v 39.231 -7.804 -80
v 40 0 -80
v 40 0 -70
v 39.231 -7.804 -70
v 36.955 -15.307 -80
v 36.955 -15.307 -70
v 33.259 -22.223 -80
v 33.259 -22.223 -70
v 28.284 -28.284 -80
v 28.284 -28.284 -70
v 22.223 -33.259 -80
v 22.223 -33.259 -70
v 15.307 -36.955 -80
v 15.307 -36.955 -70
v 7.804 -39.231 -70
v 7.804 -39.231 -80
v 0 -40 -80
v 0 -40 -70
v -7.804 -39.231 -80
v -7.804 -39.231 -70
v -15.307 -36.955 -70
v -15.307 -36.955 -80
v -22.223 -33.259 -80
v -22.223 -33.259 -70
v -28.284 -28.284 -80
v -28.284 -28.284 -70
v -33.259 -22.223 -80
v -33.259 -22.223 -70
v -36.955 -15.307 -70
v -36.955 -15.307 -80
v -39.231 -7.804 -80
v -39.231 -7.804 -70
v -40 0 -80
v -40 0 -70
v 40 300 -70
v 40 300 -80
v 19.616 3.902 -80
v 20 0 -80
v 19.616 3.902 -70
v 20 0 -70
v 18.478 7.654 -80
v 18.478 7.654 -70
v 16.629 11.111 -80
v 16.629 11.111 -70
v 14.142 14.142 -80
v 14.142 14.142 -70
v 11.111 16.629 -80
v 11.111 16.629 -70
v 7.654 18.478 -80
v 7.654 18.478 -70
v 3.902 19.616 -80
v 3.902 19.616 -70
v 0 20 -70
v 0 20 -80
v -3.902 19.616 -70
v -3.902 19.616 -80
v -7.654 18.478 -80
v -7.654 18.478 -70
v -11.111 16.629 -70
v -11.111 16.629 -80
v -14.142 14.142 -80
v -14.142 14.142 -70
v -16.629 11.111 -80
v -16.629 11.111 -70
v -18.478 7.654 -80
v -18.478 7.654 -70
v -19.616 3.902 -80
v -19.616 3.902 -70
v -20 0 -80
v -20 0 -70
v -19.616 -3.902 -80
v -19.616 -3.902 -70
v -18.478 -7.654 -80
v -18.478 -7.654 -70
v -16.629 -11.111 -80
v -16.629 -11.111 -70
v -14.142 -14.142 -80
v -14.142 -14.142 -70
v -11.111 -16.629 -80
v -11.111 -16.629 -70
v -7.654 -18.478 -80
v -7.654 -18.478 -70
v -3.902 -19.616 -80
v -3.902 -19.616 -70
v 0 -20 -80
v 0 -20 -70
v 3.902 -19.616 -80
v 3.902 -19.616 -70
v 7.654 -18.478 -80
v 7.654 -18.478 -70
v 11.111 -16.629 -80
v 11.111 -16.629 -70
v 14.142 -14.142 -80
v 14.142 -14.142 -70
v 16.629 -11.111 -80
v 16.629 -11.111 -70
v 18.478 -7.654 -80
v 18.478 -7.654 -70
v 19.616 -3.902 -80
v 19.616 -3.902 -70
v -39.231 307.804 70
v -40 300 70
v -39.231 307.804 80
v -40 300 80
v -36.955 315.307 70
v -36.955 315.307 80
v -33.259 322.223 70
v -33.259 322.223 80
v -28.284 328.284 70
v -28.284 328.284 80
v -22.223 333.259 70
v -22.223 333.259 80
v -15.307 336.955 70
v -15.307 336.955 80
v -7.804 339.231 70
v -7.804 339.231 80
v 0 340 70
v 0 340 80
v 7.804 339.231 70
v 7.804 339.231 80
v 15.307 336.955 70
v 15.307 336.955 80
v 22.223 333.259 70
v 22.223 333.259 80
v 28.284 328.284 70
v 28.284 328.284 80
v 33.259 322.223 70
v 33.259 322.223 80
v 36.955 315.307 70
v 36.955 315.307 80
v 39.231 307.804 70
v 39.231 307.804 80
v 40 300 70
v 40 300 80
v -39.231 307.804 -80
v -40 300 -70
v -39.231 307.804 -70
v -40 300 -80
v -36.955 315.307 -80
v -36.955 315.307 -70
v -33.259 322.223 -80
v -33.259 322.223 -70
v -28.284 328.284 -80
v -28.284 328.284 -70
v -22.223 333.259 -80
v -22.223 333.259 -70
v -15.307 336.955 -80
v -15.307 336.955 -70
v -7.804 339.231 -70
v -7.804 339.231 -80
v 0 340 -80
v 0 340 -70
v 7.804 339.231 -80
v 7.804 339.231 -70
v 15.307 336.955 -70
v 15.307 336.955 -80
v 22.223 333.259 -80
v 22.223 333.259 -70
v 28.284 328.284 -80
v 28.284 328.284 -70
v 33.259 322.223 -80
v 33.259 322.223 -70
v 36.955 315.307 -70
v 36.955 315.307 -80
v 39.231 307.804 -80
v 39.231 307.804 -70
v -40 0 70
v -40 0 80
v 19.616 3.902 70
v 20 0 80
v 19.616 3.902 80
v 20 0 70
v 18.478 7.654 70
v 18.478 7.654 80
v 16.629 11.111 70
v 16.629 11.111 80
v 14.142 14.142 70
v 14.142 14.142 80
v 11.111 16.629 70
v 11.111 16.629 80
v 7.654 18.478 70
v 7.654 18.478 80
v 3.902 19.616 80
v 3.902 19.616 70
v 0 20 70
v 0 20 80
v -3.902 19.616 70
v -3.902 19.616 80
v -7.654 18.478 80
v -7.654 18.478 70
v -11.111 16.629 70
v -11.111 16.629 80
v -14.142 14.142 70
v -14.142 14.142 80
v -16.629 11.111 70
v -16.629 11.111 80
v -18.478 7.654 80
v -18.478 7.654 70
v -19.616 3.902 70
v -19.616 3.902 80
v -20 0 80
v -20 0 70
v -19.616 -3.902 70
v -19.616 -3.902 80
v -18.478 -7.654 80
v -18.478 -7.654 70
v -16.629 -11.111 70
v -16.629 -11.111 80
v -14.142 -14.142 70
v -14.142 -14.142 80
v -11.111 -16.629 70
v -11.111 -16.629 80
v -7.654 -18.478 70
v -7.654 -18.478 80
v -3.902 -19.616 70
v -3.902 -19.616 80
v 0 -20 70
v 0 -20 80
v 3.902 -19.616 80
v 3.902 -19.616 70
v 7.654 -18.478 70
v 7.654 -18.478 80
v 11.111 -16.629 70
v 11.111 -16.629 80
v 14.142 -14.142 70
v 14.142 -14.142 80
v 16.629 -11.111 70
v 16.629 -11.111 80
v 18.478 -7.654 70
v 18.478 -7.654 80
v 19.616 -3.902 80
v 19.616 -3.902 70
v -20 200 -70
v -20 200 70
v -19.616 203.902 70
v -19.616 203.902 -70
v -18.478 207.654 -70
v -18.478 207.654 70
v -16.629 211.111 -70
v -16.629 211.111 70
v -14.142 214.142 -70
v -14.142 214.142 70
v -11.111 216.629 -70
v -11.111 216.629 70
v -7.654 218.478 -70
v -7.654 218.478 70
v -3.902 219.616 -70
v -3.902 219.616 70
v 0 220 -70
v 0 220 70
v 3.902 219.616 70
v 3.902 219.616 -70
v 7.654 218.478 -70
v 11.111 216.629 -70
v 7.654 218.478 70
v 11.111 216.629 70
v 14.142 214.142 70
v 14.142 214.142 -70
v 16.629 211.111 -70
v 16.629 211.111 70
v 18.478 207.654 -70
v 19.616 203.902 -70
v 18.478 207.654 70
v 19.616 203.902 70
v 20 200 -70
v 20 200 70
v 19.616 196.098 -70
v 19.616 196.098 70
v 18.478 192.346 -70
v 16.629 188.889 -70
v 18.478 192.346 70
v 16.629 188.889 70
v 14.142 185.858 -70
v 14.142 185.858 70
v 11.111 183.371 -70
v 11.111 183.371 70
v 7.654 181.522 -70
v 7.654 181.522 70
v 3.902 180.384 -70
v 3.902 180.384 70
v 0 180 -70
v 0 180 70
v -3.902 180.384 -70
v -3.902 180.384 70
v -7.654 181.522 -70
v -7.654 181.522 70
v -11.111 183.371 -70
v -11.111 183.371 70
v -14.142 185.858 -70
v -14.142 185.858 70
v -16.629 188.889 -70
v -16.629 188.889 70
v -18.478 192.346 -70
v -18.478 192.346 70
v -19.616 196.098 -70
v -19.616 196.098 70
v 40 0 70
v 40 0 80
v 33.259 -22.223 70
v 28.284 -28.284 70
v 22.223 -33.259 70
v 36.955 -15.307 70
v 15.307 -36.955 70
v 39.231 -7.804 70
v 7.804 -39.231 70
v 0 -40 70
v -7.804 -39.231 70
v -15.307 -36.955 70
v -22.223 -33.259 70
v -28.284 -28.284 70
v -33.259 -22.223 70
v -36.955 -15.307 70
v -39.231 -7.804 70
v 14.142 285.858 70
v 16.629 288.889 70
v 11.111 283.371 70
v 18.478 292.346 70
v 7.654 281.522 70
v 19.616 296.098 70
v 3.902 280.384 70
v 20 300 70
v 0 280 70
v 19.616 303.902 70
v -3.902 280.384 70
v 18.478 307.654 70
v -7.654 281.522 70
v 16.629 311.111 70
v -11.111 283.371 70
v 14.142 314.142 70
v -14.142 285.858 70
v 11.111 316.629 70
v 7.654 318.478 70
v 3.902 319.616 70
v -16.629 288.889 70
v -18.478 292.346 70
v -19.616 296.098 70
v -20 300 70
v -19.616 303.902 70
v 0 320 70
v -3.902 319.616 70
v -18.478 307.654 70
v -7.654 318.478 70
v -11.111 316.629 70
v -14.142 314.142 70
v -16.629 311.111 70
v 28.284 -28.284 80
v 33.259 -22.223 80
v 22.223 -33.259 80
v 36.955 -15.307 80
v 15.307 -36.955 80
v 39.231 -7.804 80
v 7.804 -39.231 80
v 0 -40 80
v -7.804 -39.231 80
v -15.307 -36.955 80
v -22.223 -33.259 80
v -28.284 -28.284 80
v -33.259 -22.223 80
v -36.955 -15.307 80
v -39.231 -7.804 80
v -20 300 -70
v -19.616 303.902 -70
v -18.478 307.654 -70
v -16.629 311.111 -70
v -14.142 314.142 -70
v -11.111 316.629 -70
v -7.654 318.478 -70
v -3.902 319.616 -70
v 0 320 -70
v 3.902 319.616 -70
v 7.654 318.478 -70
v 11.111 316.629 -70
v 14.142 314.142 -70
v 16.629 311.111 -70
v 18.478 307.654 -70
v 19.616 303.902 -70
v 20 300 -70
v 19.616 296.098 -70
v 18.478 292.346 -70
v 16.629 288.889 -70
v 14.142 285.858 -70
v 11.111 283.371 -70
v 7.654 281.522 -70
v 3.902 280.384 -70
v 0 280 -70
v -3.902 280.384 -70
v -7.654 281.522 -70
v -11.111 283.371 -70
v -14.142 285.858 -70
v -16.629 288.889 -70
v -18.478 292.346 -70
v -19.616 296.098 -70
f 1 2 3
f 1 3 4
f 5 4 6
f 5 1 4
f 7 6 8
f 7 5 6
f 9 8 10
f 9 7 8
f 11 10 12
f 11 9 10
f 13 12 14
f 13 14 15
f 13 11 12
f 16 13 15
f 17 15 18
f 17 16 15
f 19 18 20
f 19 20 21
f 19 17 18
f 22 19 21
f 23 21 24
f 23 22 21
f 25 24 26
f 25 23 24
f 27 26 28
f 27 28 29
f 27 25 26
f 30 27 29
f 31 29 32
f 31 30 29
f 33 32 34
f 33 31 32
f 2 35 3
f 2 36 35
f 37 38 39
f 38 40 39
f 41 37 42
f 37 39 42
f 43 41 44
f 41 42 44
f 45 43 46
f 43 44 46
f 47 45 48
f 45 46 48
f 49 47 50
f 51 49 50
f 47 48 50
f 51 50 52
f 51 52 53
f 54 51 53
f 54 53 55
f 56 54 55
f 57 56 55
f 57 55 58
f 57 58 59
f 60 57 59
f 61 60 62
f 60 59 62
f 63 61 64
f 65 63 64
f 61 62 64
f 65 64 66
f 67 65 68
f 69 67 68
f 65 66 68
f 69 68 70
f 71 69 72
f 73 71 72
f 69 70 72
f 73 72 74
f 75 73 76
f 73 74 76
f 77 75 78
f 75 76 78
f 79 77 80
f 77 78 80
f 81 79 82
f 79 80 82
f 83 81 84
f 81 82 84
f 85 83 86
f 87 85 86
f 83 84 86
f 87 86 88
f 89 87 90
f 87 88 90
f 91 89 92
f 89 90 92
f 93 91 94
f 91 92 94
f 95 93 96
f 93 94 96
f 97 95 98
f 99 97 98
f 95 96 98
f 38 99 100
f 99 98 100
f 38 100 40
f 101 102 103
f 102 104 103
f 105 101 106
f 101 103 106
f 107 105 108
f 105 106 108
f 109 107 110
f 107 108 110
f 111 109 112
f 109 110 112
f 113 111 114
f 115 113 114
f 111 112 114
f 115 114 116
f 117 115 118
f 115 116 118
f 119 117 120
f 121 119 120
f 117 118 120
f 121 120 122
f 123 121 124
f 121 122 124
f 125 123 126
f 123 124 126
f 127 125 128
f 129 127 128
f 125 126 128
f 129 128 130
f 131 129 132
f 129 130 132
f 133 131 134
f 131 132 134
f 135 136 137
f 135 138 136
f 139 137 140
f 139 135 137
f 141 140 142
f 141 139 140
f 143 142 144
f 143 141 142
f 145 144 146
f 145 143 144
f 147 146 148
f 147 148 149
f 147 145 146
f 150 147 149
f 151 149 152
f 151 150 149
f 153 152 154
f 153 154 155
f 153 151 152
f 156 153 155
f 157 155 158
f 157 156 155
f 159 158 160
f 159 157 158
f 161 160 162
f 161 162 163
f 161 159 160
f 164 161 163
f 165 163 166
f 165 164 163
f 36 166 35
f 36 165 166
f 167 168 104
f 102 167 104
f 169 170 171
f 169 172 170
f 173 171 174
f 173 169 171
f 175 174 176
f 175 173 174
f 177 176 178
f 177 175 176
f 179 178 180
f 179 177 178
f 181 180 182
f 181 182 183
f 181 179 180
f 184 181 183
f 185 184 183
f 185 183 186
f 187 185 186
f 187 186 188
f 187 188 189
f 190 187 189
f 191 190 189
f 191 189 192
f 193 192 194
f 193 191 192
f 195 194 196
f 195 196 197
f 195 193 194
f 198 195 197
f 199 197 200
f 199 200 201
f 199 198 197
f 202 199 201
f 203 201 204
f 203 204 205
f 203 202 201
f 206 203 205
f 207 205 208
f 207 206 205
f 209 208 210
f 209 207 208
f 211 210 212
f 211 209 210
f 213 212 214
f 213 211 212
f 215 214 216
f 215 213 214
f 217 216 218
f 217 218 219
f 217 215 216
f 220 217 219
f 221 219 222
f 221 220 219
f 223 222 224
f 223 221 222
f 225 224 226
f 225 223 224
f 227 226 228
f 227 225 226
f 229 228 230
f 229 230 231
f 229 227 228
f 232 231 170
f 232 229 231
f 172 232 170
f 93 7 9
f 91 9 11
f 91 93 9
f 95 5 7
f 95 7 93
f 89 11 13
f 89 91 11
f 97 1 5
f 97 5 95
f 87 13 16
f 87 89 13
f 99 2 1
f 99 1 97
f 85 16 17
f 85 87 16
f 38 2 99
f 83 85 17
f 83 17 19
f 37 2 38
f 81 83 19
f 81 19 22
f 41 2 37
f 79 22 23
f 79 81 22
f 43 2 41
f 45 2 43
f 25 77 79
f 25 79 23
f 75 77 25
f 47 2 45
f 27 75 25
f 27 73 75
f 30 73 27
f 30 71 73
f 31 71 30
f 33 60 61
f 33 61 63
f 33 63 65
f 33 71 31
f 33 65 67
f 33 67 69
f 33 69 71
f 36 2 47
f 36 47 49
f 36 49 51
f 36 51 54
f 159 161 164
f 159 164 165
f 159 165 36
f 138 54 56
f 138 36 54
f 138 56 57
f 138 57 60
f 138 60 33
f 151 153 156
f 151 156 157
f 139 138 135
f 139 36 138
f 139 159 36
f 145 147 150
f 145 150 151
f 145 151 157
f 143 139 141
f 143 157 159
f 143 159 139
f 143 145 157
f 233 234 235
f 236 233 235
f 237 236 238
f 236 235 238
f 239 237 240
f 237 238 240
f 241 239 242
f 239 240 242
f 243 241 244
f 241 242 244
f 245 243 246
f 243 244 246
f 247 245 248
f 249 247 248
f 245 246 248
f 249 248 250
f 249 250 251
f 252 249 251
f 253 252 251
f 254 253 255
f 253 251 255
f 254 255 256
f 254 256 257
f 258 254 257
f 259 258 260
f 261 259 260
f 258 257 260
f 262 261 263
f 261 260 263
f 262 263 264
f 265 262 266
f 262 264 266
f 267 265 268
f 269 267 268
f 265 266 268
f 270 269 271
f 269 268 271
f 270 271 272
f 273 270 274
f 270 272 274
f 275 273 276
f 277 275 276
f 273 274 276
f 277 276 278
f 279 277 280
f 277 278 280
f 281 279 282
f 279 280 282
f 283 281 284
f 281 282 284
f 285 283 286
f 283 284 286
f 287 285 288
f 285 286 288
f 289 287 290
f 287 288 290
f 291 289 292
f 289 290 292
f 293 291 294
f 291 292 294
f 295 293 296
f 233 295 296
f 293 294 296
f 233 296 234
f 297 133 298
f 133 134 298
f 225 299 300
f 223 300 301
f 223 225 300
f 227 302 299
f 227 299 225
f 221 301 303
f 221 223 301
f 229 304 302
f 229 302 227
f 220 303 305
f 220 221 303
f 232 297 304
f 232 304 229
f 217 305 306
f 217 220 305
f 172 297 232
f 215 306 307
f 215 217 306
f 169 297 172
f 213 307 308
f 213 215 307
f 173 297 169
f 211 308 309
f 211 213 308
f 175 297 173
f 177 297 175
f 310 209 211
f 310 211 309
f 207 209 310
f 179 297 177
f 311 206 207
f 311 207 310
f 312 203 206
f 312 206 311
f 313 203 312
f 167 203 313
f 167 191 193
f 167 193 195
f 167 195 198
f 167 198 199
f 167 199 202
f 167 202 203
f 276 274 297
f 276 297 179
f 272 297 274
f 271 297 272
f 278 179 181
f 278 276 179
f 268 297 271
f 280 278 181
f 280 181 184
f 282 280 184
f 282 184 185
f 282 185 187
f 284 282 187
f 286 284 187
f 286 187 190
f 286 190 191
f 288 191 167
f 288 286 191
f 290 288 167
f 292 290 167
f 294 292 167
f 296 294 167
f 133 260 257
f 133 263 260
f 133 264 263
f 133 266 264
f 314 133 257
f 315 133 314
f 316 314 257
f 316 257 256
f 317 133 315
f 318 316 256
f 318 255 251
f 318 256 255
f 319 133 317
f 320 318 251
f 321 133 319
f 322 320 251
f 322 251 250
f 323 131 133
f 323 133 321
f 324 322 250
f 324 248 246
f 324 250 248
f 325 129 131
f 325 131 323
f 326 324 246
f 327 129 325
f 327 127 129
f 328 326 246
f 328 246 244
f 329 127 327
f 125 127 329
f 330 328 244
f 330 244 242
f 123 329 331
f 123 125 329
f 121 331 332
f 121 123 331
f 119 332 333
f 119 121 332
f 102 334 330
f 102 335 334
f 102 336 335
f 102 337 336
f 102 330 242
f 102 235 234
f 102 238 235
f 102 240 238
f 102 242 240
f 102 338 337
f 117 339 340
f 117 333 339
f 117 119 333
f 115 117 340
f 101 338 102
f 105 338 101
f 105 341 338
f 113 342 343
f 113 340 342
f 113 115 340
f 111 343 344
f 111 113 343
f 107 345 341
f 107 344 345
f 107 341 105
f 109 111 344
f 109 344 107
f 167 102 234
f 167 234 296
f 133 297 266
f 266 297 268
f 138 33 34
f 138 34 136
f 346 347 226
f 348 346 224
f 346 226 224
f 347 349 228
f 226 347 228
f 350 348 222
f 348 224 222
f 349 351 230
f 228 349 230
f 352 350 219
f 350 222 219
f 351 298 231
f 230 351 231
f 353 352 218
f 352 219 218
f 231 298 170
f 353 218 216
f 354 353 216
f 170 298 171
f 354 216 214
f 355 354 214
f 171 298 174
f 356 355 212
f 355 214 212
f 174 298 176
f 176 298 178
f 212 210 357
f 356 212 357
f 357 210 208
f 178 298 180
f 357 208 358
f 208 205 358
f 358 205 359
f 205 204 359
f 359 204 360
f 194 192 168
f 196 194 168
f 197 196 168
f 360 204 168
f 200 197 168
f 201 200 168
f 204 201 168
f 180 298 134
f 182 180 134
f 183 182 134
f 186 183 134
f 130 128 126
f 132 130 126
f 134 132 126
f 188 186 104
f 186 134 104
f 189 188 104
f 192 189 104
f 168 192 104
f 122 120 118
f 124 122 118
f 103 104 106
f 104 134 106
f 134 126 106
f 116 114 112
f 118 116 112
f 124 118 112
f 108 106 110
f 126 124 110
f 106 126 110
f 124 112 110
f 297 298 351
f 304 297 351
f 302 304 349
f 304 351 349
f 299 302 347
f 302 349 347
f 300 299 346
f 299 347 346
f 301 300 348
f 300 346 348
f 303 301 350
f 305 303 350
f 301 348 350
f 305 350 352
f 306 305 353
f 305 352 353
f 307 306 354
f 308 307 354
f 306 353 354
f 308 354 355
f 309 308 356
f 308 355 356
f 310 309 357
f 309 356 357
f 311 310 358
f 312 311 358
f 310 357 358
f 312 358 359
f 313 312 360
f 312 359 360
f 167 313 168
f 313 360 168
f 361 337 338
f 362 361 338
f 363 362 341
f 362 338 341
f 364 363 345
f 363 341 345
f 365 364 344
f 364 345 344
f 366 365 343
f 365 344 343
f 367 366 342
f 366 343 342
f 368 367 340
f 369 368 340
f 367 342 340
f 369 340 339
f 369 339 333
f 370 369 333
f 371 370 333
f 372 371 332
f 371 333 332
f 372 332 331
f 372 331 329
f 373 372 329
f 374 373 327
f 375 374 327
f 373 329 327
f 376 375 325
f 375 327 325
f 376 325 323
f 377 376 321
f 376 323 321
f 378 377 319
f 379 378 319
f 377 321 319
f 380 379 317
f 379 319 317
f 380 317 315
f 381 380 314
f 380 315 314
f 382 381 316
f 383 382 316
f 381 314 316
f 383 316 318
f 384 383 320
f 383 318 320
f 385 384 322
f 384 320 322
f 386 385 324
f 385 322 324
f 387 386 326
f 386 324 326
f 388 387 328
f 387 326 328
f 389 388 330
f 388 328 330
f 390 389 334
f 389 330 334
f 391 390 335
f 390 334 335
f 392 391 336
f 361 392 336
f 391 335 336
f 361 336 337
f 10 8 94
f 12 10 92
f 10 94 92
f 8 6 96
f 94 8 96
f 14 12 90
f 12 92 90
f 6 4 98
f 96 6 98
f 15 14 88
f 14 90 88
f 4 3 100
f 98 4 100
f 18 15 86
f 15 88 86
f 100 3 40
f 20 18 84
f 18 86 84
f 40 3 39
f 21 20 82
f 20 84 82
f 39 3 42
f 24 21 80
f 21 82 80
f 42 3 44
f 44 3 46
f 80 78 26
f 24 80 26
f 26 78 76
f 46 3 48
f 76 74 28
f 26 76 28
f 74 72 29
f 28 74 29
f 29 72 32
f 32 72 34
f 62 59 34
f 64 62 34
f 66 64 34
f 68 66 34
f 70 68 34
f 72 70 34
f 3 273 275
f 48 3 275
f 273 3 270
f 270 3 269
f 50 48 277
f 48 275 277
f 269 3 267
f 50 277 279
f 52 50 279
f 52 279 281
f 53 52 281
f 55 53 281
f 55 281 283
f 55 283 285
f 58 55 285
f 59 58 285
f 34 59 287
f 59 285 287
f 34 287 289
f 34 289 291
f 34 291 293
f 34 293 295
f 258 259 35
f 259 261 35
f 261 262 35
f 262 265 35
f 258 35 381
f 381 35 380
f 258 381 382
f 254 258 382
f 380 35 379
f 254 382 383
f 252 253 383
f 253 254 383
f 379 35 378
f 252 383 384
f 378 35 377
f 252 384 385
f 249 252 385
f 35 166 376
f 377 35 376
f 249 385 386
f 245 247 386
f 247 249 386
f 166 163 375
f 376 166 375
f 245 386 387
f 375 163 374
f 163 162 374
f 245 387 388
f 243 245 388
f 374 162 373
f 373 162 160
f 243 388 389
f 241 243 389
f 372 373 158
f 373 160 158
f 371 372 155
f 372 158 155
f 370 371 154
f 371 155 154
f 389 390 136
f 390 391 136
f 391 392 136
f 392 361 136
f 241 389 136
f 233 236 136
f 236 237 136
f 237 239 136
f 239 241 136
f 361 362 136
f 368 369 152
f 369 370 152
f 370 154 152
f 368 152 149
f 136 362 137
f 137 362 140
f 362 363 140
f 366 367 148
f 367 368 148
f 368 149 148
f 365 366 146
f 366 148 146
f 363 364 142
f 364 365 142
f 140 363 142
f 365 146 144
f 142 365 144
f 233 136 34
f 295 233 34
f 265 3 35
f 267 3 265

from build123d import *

# Parameters (mm, degrees)
BOSS_EXTRUDE1_START = 75
SKETCH1_R           = 20
BOSS_EXTRUDE1_DEPTH = 5
SKETCH2_R           = 20
BOSS_EXTRUDE2_DEPTH = 140


with BuildPart() as part:
    # Sketch1 → Boss-Extrude1 (new body, symmetric)
    with BuildSketch(Plane.XY.offset(BOSS_EXTRUDE1_START)):
        with BuildLine():
            Line((-40, 0), (-40, 300))
            ThreePointArc((-40, 300), (0, 340), (40, 300))
            Line((40, 300), (40, 0))
            ThreePointArc((40, 0), (0, -40), (-40, 0))
        make_face()
        Circle(SKETCH1_R, mode=Mode.SUBTRACT)
    boss_extrude1 = extrude(amount=BOSS_EXTRUDE1_DEPTH, both=True)

    # Sketch2 → Boss-Extrude2 (add)
    with BuildSketch(Plane(origin=(0, 0, 70), x_dir=(-1, 0, 0), z_dir=(0, 0, -1))):
        with Locations((0, 300)):
            Circle(SKETCH2_R)
        with Locations((0, 200)):
            Circle(SKETCH2_R)
    extrude(amount=BOSS_EXTRUDE2_DEPTH)

    # Mirror2: Boss-Extrude1 across plane
    add(boss_extrude1.mirror(Plane.XY))


solid = part.part
